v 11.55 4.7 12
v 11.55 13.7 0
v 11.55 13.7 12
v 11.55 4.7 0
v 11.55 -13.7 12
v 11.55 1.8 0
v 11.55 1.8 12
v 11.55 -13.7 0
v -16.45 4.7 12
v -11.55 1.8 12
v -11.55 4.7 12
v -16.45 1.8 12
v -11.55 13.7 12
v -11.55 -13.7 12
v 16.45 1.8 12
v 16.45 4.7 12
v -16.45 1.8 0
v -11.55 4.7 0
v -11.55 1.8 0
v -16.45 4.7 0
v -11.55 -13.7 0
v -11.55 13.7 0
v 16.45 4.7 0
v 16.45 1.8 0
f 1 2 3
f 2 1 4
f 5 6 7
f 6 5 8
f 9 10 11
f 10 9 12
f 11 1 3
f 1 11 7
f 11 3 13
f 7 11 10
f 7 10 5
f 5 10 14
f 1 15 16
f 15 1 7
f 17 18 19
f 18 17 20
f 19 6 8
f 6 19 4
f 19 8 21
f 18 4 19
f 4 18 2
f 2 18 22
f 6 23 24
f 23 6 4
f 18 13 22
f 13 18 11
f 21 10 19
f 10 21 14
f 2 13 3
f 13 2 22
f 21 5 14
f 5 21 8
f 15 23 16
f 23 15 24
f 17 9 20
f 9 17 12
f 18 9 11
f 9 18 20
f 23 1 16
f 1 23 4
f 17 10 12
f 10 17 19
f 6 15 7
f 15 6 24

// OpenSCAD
breedte = 22.7;
hele_breedte = 32.5;
diepte = 27;
dikte_rand = 2.5;
marge = 0.2;

difference(){
	union(){
        
        translate([-(hele_breedte+marge*2)/2,-(diepte+marge*2)/2,0]){

            translate([(hele_breedte-breedte)/2,0,0]){
                cube([breedte+marge*2,diepte+marge*2,12], center=false);
            }         
            translate([0,15.5,0]){
                cube([hele_breedte+marge*2,dikte_rand+marge*2,12], center=false);
            }         
        }


	}
	union() {

	}
}
